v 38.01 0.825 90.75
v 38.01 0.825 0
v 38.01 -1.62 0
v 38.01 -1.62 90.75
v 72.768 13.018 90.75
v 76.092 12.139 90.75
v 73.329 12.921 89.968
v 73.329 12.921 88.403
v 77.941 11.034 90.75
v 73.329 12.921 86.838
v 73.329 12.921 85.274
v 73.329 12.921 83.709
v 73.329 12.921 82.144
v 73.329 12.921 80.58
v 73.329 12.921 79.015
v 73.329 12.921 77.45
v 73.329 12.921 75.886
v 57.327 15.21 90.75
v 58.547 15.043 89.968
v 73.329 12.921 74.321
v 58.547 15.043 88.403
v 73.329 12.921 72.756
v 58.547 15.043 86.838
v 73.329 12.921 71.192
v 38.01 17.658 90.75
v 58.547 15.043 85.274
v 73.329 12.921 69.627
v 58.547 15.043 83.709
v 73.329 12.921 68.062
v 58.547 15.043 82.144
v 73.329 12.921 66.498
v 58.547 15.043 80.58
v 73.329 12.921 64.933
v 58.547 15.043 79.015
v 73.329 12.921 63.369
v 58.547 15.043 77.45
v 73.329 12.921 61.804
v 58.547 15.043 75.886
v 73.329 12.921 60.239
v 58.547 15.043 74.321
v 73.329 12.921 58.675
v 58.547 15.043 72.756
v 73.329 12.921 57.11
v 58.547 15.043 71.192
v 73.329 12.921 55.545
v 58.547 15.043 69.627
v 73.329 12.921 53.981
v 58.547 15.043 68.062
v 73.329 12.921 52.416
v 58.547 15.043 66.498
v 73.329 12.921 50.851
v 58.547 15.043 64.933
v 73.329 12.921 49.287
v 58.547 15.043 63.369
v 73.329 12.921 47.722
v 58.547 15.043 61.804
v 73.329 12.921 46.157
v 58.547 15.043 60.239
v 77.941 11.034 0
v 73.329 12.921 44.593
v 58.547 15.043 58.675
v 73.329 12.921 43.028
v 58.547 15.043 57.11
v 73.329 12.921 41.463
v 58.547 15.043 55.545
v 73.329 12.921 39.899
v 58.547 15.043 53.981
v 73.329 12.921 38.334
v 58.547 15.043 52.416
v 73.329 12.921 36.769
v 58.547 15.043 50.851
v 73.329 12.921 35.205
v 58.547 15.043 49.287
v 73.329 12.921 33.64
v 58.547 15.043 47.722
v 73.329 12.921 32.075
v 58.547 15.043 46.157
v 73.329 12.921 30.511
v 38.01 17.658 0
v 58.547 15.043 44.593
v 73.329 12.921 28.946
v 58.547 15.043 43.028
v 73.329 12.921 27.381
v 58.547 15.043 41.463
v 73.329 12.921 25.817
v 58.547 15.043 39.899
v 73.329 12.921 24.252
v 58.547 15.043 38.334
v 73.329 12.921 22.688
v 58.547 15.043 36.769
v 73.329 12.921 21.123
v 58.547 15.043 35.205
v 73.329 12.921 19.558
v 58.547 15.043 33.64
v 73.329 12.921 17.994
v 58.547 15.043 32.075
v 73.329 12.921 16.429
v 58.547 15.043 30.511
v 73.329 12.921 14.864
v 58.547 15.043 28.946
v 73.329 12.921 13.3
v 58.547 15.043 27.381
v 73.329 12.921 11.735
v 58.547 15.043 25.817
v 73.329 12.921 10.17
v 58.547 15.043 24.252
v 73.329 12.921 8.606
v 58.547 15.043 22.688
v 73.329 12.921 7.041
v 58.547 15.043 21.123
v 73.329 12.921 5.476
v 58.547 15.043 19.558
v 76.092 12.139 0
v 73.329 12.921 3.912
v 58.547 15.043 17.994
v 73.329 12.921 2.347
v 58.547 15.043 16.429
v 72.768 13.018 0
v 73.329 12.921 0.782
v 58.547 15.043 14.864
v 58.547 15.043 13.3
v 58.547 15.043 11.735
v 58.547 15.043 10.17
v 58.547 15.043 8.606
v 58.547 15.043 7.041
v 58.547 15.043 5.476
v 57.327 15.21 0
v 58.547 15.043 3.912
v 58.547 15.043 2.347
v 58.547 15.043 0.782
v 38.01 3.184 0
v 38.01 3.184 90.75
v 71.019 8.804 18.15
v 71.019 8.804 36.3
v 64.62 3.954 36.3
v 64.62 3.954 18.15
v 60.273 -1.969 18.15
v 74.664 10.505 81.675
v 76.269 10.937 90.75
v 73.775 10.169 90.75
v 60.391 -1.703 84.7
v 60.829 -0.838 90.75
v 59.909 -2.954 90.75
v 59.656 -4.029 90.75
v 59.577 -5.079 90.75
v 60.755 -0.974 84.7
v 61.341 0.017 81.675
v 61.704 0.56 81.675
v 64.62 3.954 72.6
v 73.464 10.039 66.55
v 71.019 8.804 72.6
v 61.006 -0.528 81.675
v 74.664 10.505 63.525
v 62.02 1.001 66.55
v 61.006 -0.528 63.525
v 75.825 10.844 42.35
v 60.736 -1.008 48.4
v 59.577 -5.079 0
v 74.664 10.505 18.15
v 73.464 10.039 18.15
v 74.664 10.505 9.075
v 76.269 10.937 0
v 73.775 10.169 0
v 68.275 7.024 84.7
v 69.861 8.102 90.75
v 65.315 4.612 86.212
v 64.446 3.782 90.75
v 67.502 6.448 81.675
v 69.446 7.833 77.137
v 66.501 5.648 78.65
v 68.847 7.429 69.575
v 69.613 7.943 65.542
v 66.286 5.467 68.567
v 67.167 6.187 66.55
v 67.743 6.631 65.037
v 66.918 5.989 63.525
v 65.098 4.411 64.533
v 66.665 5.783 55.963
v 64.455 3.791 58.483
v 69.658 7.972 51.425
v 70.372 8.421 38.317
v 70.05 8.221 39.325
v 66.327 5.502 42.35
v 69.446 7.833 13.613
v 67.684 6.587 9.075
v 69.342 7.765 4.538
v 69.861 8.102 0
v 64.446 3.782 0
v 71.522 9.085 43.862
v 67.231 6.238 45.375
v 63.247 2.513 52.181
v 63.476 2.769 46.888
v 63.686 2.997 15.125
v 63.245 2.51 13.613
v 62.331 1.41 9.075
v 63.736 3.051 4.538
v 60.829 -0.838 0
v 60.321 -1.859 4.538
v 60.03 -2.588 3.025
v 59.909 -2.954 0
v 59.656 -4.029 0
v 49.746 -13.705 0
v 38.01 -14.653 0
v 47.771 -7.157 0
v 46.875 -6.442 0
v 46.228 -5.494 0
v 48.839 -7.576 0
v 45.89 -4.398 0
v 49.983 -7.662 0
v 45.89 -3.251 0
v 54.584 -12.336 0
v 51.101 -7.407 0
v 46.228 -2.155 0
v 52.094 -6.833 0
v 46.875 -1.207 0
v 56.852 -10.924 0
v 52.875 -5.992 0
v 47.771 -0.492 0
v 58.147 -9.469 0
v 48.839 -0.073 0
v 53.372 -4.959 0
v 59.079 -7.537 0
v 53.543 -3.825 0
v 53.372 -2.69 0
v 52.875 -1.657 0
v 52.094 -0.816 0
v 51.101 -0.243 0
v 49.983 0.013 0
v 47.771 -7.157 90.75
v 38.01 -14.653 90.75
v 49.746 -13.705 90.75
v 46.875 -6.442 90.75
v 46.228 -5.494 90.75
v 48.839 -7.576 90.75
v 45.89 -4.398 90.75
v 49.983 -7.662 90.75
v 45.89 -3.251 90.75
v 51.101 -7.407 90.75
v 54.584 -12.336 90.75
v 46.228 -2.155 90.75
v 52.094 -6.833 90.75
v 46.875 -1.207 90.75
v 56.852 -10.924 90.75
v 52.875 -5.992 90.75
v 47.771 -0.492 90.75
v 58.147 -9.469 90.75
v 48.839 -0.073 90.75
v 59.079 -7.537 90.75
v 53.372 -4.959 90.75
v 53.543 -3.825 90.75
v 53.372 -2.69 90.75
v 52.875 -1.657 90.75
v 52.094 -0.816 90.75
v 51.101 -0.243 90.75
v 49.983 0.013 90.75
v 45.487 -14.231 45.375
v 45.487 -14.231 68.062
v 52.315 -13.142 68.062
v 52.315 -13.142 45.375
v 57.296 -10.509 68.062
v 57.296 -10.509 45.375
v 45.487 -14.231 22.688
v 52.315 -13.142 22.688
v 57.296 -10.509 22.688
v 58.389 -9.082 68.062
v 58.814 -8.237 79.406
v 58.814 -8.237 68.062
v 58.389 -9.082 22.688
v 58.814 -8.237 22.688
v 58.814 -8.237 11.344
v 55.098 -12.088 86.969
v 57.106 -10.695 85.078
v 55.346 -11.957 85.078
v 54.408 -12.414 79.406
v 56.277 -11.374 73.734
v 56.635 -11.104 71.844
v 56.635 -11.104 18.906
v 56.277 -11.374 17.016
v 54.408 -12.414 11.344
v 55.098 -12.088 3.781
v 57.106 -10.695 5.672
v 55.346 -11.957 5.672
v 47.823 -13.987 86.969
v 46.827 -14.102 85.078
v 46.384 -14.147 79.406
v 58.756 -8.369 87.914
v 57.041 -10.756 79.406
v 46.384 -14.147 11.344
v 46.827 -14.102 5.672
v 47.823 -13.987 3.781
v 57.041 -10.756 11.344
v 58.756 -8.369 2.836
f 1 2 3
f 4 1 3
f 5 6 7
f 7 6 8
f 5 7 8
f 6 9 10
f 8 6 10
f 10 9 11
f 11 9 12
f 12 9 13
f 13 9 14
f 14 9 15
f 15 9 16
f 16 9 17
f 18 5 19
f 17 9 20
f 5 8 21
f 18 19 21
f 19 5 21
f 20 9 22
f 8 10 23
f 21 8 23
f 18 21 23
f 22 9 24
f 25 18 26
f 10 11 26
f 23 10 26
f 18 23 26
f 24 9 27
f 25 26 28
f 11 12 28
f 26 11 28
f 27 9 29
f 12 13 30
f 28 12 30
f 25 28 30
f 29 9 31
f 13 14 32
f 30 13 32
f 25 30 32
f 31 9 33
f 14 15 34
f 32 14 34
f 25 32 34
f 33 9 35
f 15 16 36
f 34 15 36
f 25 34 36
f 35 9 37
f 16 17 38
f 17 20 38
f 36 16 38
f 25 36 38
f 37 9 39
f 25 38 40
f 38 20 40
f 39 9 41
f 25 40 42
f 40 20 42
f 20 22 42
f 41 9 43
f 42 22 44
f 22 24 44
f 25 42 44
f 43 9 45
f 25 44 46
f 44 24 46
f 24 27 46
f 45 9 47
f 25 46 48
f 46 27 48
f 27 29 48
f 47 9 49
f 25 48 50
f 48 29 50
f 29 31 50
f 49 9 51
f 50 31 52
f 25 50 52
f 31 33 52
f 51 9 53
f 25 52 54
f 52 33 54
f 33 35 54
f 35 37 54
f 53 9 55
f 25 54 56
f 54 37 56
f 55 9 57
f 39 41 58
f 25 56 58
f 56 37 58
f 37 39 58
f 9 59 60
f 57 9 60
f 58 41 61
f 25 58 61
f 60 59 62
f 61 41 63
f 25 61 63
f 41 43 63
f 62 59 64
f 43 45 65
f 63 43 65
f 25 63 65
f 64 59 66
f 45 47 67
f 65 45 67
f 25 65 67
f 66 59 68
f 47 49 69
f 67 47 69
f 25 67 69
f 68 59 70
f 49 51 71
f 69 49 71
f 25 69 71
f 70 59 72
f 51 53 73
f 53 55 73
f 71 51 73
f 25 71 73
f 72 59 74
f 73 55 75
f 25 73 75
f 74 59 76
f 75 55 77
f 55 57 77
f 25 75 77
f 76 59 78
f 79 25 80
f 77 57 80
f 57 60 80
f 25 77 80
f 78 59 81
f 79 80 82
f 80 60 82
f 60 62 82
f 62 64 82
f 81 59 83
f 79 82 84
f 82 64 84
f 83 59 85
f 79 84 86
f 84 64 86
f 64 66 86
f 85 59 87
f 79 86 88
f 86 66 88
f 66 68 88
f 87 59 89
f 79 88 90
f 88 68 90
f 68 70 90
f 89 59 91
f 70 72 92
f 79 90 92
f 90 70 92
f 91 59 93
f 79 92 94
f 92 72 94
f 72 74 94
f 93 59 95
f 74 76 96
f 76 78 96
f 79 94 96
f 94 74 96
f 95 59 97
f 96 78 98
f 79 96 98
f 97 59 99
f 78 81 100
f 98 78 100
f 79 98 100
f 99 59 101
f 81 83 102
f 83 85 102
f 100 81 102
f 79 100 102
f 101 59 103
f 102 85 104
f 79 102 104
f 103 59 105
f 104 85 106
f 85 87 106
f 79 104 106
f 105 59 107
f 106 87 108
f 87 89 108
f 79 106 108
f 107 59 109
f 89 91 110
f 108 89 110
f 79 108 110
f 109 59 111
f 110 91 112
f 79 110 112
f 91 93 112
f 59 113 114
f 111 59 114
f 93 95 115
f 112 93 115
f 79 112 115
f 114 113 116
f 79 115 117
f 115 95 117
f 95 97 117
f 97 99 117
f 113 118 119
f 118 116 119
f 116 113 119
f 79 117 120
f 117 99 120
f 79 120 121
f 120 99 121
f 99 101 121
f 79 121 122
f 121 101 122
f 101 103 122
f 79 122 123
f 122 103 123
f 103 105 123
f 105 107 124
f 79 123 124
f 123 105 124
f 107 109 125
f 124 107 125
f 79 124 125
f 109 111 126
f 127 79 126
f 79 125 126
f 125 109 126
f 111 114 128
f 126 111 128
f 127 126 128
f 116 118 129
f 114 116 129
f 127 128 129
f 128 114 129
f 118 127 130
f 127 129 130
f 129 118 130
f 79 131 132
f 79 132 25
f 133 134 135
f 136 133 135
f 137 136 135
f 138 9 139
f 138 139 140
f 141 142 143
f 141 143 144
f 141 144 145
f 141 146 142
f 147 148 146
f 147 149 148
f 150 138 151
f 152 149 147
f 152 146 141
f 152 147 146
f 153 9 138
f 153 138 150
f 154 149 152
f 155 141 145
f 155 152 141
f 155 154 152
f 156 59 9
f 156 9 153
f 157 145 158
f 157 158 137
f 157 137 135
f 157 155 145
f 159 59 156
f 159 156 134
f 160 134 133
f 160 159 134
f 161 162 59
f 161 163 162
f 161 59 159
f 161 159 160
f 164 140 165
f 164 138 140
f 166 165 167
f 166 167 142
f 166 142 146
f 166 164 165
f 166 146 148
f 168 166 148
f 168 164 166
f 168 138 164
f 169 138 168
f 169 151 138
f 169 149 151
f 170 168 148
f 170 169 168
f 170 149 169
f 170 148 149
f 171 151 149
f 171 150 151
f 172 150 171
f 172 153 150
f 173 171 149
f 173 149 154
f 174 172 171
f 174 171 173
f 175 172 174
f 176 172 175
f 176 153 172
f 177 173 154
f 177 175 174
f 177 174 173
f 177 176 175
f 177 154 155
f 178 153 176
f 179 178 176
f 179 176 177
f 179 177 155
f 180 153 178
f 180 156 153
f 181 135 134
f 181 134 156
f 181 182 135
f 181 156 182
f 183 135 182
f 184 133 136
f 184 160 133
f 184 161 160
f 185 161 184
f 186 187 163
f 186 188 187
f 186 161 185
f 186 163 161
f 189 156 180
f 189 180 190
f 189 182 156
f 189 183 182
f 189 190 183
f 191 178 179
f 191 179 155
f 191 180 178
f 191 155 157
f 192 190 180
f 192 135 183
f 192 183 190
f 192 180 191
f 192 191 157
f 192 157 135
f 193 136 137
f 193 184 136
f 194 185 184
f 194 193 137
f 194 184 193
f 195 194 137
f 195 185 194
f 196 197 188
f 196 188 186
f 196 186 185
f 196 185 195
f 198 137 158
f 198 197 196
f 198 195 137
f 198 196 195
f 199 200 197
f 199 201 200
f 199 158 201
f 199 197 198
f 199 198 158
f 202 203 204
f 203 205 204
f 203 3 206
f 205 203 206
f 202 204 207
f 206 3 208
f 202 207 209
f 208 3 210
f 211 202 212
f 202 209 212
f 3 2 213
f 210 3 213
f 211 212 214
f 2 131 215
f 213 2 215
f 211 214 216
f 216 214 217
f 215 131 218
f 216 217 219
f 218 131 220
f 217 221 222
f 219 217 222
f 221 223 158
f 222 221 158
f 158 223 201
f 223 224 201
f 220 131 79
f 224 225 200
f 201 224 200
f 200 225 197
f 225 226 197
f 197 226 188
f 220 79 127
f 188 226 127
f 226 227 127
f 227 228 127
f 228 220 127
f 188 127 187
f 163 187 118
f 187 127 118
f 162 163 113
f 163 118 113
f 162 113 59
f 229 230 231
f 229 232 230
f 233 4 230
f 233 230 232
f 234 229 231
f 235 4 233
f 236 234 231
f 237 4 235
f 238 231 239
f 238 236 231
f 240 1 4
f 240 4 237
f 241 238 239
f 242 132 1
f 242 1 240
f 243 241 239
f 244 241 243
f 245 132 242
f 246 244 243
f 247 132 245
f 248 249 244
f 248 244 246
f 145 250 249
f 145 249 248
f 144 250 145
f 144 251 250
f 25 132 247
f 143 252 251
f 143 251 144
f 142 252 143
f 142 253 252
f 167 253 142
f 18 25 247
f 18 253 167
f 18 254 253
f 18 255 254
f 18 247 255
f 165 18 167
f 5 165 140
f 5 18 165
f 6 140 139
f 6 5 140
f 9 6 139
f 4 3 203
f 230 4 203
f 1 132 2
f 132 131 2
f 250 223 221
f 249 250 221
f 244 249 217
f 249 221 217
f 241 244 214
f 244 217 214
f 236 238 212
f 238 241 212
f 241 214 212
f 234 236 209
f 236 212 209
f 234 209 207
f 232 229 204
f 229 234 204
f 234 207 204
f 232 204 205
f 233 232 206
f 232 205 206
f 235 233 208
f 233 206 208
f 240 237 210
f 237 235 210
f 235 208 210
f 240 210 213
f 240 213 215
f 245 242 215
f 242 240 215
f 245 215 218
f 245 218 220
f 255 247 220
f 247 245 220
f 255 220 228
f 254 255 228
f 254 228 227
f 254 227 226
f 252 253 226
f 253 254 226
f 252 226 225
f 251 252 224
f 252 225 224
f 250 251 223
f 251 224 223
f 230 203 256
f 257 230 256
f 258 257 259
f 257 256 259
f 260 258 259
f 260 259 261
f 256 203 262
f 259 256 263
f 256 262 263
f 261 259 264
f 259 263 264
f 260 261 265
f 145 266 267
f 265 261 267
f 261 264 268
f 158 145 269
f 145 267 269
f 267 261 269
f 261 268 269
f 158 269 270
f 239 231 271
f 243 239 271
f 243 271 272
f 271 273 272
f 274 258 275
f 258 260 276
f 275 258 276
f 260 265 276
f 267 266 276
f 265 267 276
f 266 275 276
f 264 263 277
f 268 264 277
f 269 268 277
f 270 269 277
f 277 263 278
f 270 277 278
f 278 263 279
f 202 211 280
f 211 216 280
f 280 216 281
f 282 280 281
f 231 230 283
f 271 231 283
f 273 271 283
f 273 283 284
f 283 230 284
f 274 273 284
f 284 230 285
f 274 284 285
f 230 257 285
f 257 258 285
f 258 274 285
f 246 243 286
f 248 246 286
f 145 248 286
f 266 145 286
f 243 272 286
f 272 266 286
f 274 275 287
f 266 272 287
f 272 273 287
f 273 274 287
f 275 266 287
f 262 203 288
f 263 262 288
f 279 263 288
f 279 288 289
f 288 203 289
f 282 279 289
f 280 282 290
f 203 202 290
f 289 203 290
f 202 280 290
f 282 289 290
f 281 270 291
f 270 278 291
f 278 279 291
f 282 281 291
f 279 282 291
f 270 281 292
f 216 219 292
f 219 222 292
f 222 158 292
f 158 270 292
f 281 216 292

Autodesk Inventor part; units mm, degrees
ref_plane "YZ Plane" through (0, 0, 0) normal (1, 0, 0) x (0, 1, 0)
ref_plane "XZ Plane" through (0, 0, 0) normal (0, 1, 0) x (-1, 0, 0)
ref_plane "XY Plane" through (0, 0, 0) normal (0, 0, 1) x (1, 0, 0)
sketch "Sketch3" plane through (0, 0, 0) normal (0, 0, 1) x (1, 0, 0)
  line L0 (-80.5781, 0.8246) -> (-80.5781, 20.7988) construction
  circle A0 centre (-80.5781, 0.8246) radius 13.481
  line L1 (-53.7179, 12.5571) -> (-53.7179, -10.9927)
  arc A1 (-53.7179, -10.9927) -> (-51.5054, -12.9814) centre (-51.7179, -10.9927) ccw
  arc A2 (-51.5054, 14.5458) -> (-53.7179, 12.5571) centre (-51.7179, 12.5571) ccw
  line L2 (36.2229, -3.6088) -> (-51.5054, -12.9814)
  line L3 (38.0104, 3.1845) -> (38.0104, -1.6201)
  line L4 (-80.5781, 0.8246) -> (49.5525, 0.8246) construction
  circle A3 centre (49.6953, -3.8247) radius 3.848
  line L5 (59.6953, 14.884) -> (59.6953, -12.7998) construction
  spline S0 degree 4 poles (77.9414, 11.0338) (75.5683, 12.9654) (71.7145, 13.0272) (66.8099, 13.9036) (60.7685, 14.7338) (56.2959, 15.3578) (51.7728, 15.9509) (47.2242, 16.5426) (42.6244, 17.1111) (37.9974, 17.6651) (33.3378, 18.1987) (28.6546, 18.7114) (23.9504, 19.2026) (19.2309, 19.6699) (14.5002, 20.1135) (9.7632, 20.5291) (5.025, 20.9191) (0.2903, 21.2792) (-4.4372, 21.6095) (-9.151, 21.9092) (-13.8524, 22.1766) (-18.5268, 22.4102) (-23.2002, 22.6105) (-27.8558, 22.7627) (-32.4748, 22.8704) (-37.0553, 22.9312) (-41.5904, 22.9454) (-46.0738, 22.9127) (-50.5027, 22.8323) (-54.8678, 22.7052) (-59.1755, 22.5324) (-63.394, 22.3084) (-67.5752, 22.0492) (-71.5451, 21.7209) (-75.7777, 21.4072) (-79.04, 20.9063) (-83.4863, 20.5541) (-87.0067, 20.037) (-90.7113, 19.5168) (-94.2172, 18.9459) (-97.6363, 18.3426) (-100.9342, 17.7015) (-104.1216, 17.0263) (-107.1909, 16.3187) (-110.1396, 15.5797) (-112.9656, 14.8117) (-115.6652, 14.0172) (-118.2357, 13.1965) (-120.6759, 12.3541) (-122.9817, 11.4895) (-125.1529, 10.6071) (-127.1857, 9.7065) (-129.0794, 8.7914) (-130.8324, 7.8633) (-132.4429, 6.923) (-133.9096, 5.9737) (-135.2322, 5.016) (-136.4083, 4.0508) (-137.4392, 3.0816) (-138.3215, 2.1025) (-139.0592, 1.1321) (-139.6407, 0.1249) (-140.106, -0.8362) (-140.3589, -2.0477) (-140.602, -2.598) (-140.1166, -5.4607) (-140.0539, -5.4622) (-139.4639, -6.7645) (-138.8842, -7.4979) (-138.1173, -8.3934) (-137.2199, -9.1877) (-136.1721, -9.9852) (-134.9893, -10.738) (-133.6669, -11.4655) (-132.2091, -12.1599) (-130.6156, -12.8245) (-128.8897, -13.4579) (-127.0312, -14.0591) (-125.0439, -14.6296) (-122.9287, -15.1678) (-120.6879, -15.6738) (-118.3241, -16.1476) (-115.8396, -16.5892) (-113.2366, -16.9984) (-110.5176, -17.3742) (-107.6861, -17.7183) (-104.7439, -18.0297) (-101.6943, -18.3095) (-98.5398, -18.5568) (-95.2843, -18.7732) (-91.9297, -18.9579) (-88.48, -19.1131) (-84.9381, -19.2376) (-81.3071, -19.3341) (-77.5906, -19.4015) (-73.7915, -19.4421) (-69.9139, -19.4561) (-65.961, -19.445) (-61.9362, -19.4102) (-57.8434, -19.3518) (-53.6861, -19.2727) (-49.4679, -19.1731) (-45.1932, -19.0538) (-40.8649, -18.9183) (-36.4879, -18.766) (-32.0649, -18.5992) (-27.598, -18.4192) (-23.0941, -18.227) (-18.5434, -18.0273) (-13.9382, -17.8076) (-9.3141, -17.5719) (-4.666, -17.3195) (-0.0002, -17.052) (4.6675, -16.7728) (9.3655, -16.4759) (14.0236, -16.1832) (19.545, -15.7815) (23.3079, -15.6072) (27.1098, -15.1781) (28.8959, -15.0599) knots 0 0 0 0 0 0.024672 0.034555 0.0445 0.054495 0.064543 0.074632 0.084755 0.094911 0.105094 0.115299 0.125521 0.135755 0.145995 0.156237 0.166475 0.176705 0.186921 0.197118 0.207299 0.217463 0.227605 0.23772 0.247796 0.257824 0.267798 0.277713 0.287563 0.297345 0.307053 0.31668 0.326224 0.335555 0.344908 0.354162 0.363308 0.372467 0.381393 0.390196 0.398872 0.407415 0.41582 0.424082 0.432193 0.44015 0.447945 0.455574 0.46303 0.470307 0.477401 0.484305 0.491015 0.497525 0.503831 0.509931 0.515822 0.521506 0.526986 0.53227 0.537373 0.542316 0.547131 0.552525 0.557529 0.562533 0.567581 0.57205 0.576988 0.582082 0.587354 0.592817 0.598478 0.604341 0.610406 0.616671 0.623133 0.629789 0.636632 0.643658 0.650861 0.658236 0.665777 0.673478 0.681333 0.689338 0.697486 0.705771 0.71419 0.722736 0.731403 0.740188 0.749084 0.758087 0.767192 0.776393 0.785687 0.795067 0.804529 0.814069 0.823682 0.833362 0.843106 0.852907 0.862763 0.872667 0.88262 0.892624 0.902675 0.912766 0.92289 0.933033 0.943191 0.953358 0.963531 0.973703 0.984092 1 1 1 1 1
  line L6 (7.5013, -16.4763) -> (50.2906, -13.6435) construction
  arc A4 (44.8353, -17.2546) -> (13.385, -19.3367) centre (31.5327, -54.8885) ccw construction
  line L7 (159.6953, -3.8066) -> (59.6953, -3.8066) construction
  line L8 (-51.5054, 14.5458) -> (36.2229, 5.1732)
  arc A5 (36.2229, -3.6088) -> (38.0104, -1.6201) centre (36.0104, -1.6201) ccw
  arc A6 (38.0104, 3.1845) -> (36.2229, 5.1732) centre (36.0104, 3.1845) ccw
  spline S1 degree 4 poles (78.1029, 11.0141) (76.6463, 11.2227) (73.9909, 10.5042) (70.2765, 8.6041) (66.0429, 5.3938) (62.3889, 1.8499) (60.314, -1.2467) (59.5572, -3.5763) (59.5773, -5.0793) knots 0 0 0 0 0 0.302475 0.43895 0.576633 0.708802 1 1 1 1 1
  spline S2 degree 4 poles (28.8959, -15.0599) (34.0984, -14.7105) (49.269, -14.182) (58.5645, -15.239) (59.5773, -5.0793) knots 0 0 0 0 0 1 1 1 1 1
  line L9 (28.8959, -15.0599) -> (34.0984, -14.7105) construction
  line L10 (34.0984, -14.7105) -> (49.269, -14.182) construction
  line L11 (49.269, -14.182) -> (58.5645, -15.239) construction
  line L12 (58.5645, -15.239) -> (59.5773, -5.0793) construction
  line L13 (-140.4646, -2.8394) -> (159.4818, -3.8173) construction
  line L14 (-132.0856, 0.6333) -> (-132.0856, -6.3667)
  line L15 (-132.0856, -6.3667) -> (-110.3816, -12.3574)
  line L16 (-110.3816, -12.3574) -> (-104.797, -12.3574)
  line L17 (-104.797, -12.3574) -> (-104.797, -18.0156)
  line L18 (-132.0856, 0.6333) -> (-110.3816, 10.553)
  line L19 (-110.3816, 10.553) -> (-104.1736, 10.553)
  line L20 (-104.1736, 10.553) -> (-104.1736, 17.0026)
  line L21 (38.0104, 0.8246) -> (38.0104, -14.6534)
  line L22 (38.0104, 0.8246) -> (38.0104, 17.6585)
  point P0 (0, 0)
  point P1 (17.6589, 23.5628)
  point P2 (75.883, 10.8572)
  point P3 (72.8647, 9.7686)
  point P4 (69.4179, 7.8149)
  point P5 (66.0452, 5.2617)
  point P6 (63.1887, 2.4463)
  point P7 (61.1228, -0.3317)
  point P8 (59.9357, -2.8689)
  point P9 (-160.0931, -3.8671)
  point P10 (28.8959, -15.0599)
  point P11 (69.5533, 13.4647)
  point P12 (65.1899, 14.1023)
  point P13 (60.7936, 14.7318)
  point P14 (56.3207, 15.3468)
  point P15 (51.7945, 15.947)
  point P16 (47.2398, 16.5346)
  point P17 (42.6414, 17.1053)
  point P18 (33.3491, 18.1925)
  point P19 (28.6632, 18.7055)
  point P20 (23.9568, 19.1966)
  point P21 (19.2348, 19.6643)
  point P22 (14.5017, 20.1074)
  point P23 (9.7623, 20.5238)
  point P24 (5.0217, 20.9132)
  point P25 (0.2844, 21.2735)
  point P26 (-4.4451, 21.6038)
  point P27 (-9.1614, 21.9032)
  point P28 (-13.86, 22.1702)
  point P29 (-18.5361, 22.4036)
  point P30 (-23.211, 22.601)
  point P31 (-27.8721, 22.754)
  point P32 (-32.4966, 22.8611)
  point P33 (-37.0797, 22.9217)
  point P34 (-41.6169, 22.9356)
  point P35 (-46.1028, 22.9023)
  point P36 (-50.5329, 22.8216)
  point P37 (-54.9021, 22.6941)
  point P38 (-59.2065, 22.5195)
  point P39 (-63.4406, 22.2977)
  point P40 (-67.6008, 22.0302)
  point P41 (-71.6806, 21.7165)
  point P42 (-75.6814, 21.3591)
  point P43 (-79.1834, 20.9458)
  point P44 (-83.4048, 20.5095)
  point P45 (-87.1309, 20.023)
  point P46 (-90.7527, 19.494)
  point P47 (-94.2725, 18.9266)
  point P48 (-97.6845, 18.3211)
  point P49 (-100.9861, 17.6791)
  point P50 (-107.2438, 16.2934)
  point P51 (-110.1931, 15.553)
  point P52 (-113.0194, 14.7835)
  point P53 (-115.7191, 13.987)
  point P54 (-118.2898, 13.165)
  point P55 (-120.7294, 12.3201)
  point P56 (-123.0349, 11.454)
  point P57 (-125.2048, 10.569)
  point P58 (-127.2364, 9.6666)
  point P59 (-129.1282, 8.7491)
  point P60 (-130.8786, 7.8185)
  point P61 (-132.486, 6.8762)
  point P62 (-133.9488, 5.9245)
  point P63 (-135.2661, 4.9648)
  point P64 (-136.4363, 3.9987)
  point P65 (-137.4592, 3.0275)
  point P66 (-138.3336, 2.0531)
  point P67 (-139.0591, 1.0763)
  point P68 (-139.6352, 0.0983)
  point P69 (-140.0613, -0.8802)
  point P70 (-140.338, -1.8576)
  point P71 (-140.1239, -5.2398)
  point P72 (-139.9547, -5.7022)
  point P73 (-139.492, -6.6066)
  point P74 (-138.8844, -7.4823)
  point P75 (-138.1328, -8.3292)
  point P76 (-137.2384, -9.147)
  point P77 (-136.202, -9.9355)
  point P78 (-135.0249, -10.6943)
  point P79 (-133.7085, -11.4228)
  point P80 (-132.2548, -12.1206)
  point P81 (-130.6648, -12.7879)
  point P82 (-128.941, -13.4239)
  point P83 (-127.0846, -14.0282)
  point P84 (-125.0983, -14.6009)
  point P85 (-122.9839, -15.1415)
  point P86 (-120.7435, -15.6497)
  point P87 (-118.3798, -16.1256)
  point P88 (-115.8952, -16.569)
  point P89 (-113.2918, -16.9797)
  point P90 (-110.5723, -17.3574)
  point P91 (-107.74, -17.7027)
  point P92 (-101.7463, -18.2964)
  point P93 (-98.5909, -18.5451)
  point P94 (-95.3341, -18.7623)
  point P95 (-91.9783, -18.9484)
  point P96 (-88.5271, -19.1041)
  point P97 (-84.9838, -19.2298)
  point P98 (-81.3514, -19.3267)
  point P99 (-77.6332, -19.3951)
  point P100 (-73.8324, -19.4362)
  point P101 (-69.9531, -19.4509)
  point P102 (-65.9985, -19.4404)
  point P103 (-61.9719, -19.4059)
  point P104 (-57.8772, -19.3483)
  point P105 (-53.718, -19.2694)
  point P106 (-49.4979, -19.1701)
  point P107 (-45.2211, -19.0516)
  point P108 (-40.8909, -18.916)
  point P109 (-36.5118, -18.7642)
  point P110 (-32.0871, -18.5977)
  point P111 (-27.6213, -18.418)
  point P112 (-23.1183, -18.2269)
  point P113 (-18.5646, -18.0247)
  point P114 (-13.9566, -17.8054)
  point P115 (-9.3252, -17.5693)
  point P116 (-4.674, -17.317)
  point P117 (-0.0078, -17.05)
  point P118 (4.6686, -16.7695)
  point P119 (9.3513, -16.477)
  point P120 (14.0352, -16.1731)
  point P121 (18.7161, -15.8596)
  point P122 (23.3889, -15.5371)
  point P123 (78.0825, 12.164)
  point P124 (159.2574, -3.8401)
  point P125 (158.8836, -3.8779)
  point P126 (158.3607, -3.9307)
  point P127 (157.6896, -3.9985)
  point P128 (156.8706, -4.081)
  point P129 (155.9046, -4.1779)
  point P130 (154.7931, -4.2892)
  point P131 (153.5367, -4.4143)
  point P132 (152.1372, -4.5532)
  point P133 (150.5955, -4.7056)
  point P134 (148.914, -4.8712)
  point P135 (147.0936, -5.0494)
  point P136 (145.137, -5.2399)
  point P137 (143.0457, -5.4421)
  point P138 (140.8221, -5.6563)
  point P139 (138.4686, -5.8813)
  point P140 (135.9876, -6.1174)
  point P141 (133.3815, -6.3634)
  point P142 (130.6533, -6.6196)
  point P143 (127.8054, -6.8851)
  point P144 (124.8414, -7.1596)
  point P145 (121.7634, -7.4428)
  point P146 (118.5756, -7.7341)
  point P147 (115.2804, -8.0332)
  point P148 (111.8817, -8.3395)
  point P149 (108.3828, -8.6527)
  point P150 (104.787, -8.9722)
  point P151 (101.0985, -9.2974)
  point P152 (97.3206, -9.6283)
  point P153 (93.4572, -9.9643)
  point P154 (89.5122, -10.3048)
  point P155 (85.4898, -10.6492)
  point P156 (81.3936, -10.9969)
  point P157 (77.2284, -11.3479)
  point P158 (72.9975, -11.701)
  point P159 (68.7057, -12.0556)
  point P160 (64.3572, -12.4117)
  point P161 (59.9559, -12.7678)
  point P162 (55.5069, -13.1239)
  point P163 (51.0138, -13.4788)
  point P164 (46.4817, -13.8316)
  point P165 (41.9148, -14.182)
  point P166 (35.7035, -14.3277)
  point P167 (32.6946, -14.8708)
  point P168 (82.2459, 11.5043)
  point P169 (86.3364, 10.8401)
  point P170 (90.3495, 10.1732)
  point P171 (94.2816, 9.5051)
  point P172 (98.1288, 8.837)
  point P173 (101.8872, 8.171)
  point P174 (105.5538, 7.5086)
  point P175 (109.1244, 6.8507)
  point P176 (112.596, 6.1997)
  point P177 (115.9653, 5.5565)
  point P178 (119.2287, 4.9229)
  point P179 (122.3835, 4.3007)
  point P180 (125.4264, 3.6911)
  point P181 (128.3547, 3.0956)
  point P182 (131.1654, 2.5157)
  point P183 (133.8561, 1.9532)
  point P184 (136.4244, 1.4093)
  point P185 (138.8676, 0.8855)
  point P186 (141.1833, 0.383)
  point P187 (143.3697, -0.0964)
  point P188 (145.4247, -0.5518)
  point P189 (147.3462, -0.9817)
  point P190 (149.1327, -1.3852)
  point P191 (150.7821, -1.7608)
  point P192 (152.2935, -2.1073)
  point P193 (153.6651, -2.4241)
  point P194 (154.8954, -2.7103)
  point P195 (155.9838, -2.9647)
  point P196 (156.9291, -3.187)
  point P197 (157.7307, -3.376)
  point P198 (158.3871, -3.5317)
  point P199 (158.8986, -3.6529)
  dimension "d3" = 26.962
  dimension "d6" = 7.696
  dimension "d7" = 110
  dimension "d8" = 100
  dimension "d9" = 2
  dimension "d11" = 4.6493
  dimension "d25" = 7
  dimension "d26" = 3.5
  dimension "d27" = 8.379
  dimension "d28" = 30.083
  dimension "d29" = 5
  dimension "d30" = 5
  dimension "d31" = 59.8865
extrude "Extrusion3" add sketch "Sketch3" along normal blind 90.75 contours L22 S0 S1 S2 L21 L3
properties part number "3P.05.07.JS.flap trailing edge 90_CPY" material "Polyurethane Foam"
